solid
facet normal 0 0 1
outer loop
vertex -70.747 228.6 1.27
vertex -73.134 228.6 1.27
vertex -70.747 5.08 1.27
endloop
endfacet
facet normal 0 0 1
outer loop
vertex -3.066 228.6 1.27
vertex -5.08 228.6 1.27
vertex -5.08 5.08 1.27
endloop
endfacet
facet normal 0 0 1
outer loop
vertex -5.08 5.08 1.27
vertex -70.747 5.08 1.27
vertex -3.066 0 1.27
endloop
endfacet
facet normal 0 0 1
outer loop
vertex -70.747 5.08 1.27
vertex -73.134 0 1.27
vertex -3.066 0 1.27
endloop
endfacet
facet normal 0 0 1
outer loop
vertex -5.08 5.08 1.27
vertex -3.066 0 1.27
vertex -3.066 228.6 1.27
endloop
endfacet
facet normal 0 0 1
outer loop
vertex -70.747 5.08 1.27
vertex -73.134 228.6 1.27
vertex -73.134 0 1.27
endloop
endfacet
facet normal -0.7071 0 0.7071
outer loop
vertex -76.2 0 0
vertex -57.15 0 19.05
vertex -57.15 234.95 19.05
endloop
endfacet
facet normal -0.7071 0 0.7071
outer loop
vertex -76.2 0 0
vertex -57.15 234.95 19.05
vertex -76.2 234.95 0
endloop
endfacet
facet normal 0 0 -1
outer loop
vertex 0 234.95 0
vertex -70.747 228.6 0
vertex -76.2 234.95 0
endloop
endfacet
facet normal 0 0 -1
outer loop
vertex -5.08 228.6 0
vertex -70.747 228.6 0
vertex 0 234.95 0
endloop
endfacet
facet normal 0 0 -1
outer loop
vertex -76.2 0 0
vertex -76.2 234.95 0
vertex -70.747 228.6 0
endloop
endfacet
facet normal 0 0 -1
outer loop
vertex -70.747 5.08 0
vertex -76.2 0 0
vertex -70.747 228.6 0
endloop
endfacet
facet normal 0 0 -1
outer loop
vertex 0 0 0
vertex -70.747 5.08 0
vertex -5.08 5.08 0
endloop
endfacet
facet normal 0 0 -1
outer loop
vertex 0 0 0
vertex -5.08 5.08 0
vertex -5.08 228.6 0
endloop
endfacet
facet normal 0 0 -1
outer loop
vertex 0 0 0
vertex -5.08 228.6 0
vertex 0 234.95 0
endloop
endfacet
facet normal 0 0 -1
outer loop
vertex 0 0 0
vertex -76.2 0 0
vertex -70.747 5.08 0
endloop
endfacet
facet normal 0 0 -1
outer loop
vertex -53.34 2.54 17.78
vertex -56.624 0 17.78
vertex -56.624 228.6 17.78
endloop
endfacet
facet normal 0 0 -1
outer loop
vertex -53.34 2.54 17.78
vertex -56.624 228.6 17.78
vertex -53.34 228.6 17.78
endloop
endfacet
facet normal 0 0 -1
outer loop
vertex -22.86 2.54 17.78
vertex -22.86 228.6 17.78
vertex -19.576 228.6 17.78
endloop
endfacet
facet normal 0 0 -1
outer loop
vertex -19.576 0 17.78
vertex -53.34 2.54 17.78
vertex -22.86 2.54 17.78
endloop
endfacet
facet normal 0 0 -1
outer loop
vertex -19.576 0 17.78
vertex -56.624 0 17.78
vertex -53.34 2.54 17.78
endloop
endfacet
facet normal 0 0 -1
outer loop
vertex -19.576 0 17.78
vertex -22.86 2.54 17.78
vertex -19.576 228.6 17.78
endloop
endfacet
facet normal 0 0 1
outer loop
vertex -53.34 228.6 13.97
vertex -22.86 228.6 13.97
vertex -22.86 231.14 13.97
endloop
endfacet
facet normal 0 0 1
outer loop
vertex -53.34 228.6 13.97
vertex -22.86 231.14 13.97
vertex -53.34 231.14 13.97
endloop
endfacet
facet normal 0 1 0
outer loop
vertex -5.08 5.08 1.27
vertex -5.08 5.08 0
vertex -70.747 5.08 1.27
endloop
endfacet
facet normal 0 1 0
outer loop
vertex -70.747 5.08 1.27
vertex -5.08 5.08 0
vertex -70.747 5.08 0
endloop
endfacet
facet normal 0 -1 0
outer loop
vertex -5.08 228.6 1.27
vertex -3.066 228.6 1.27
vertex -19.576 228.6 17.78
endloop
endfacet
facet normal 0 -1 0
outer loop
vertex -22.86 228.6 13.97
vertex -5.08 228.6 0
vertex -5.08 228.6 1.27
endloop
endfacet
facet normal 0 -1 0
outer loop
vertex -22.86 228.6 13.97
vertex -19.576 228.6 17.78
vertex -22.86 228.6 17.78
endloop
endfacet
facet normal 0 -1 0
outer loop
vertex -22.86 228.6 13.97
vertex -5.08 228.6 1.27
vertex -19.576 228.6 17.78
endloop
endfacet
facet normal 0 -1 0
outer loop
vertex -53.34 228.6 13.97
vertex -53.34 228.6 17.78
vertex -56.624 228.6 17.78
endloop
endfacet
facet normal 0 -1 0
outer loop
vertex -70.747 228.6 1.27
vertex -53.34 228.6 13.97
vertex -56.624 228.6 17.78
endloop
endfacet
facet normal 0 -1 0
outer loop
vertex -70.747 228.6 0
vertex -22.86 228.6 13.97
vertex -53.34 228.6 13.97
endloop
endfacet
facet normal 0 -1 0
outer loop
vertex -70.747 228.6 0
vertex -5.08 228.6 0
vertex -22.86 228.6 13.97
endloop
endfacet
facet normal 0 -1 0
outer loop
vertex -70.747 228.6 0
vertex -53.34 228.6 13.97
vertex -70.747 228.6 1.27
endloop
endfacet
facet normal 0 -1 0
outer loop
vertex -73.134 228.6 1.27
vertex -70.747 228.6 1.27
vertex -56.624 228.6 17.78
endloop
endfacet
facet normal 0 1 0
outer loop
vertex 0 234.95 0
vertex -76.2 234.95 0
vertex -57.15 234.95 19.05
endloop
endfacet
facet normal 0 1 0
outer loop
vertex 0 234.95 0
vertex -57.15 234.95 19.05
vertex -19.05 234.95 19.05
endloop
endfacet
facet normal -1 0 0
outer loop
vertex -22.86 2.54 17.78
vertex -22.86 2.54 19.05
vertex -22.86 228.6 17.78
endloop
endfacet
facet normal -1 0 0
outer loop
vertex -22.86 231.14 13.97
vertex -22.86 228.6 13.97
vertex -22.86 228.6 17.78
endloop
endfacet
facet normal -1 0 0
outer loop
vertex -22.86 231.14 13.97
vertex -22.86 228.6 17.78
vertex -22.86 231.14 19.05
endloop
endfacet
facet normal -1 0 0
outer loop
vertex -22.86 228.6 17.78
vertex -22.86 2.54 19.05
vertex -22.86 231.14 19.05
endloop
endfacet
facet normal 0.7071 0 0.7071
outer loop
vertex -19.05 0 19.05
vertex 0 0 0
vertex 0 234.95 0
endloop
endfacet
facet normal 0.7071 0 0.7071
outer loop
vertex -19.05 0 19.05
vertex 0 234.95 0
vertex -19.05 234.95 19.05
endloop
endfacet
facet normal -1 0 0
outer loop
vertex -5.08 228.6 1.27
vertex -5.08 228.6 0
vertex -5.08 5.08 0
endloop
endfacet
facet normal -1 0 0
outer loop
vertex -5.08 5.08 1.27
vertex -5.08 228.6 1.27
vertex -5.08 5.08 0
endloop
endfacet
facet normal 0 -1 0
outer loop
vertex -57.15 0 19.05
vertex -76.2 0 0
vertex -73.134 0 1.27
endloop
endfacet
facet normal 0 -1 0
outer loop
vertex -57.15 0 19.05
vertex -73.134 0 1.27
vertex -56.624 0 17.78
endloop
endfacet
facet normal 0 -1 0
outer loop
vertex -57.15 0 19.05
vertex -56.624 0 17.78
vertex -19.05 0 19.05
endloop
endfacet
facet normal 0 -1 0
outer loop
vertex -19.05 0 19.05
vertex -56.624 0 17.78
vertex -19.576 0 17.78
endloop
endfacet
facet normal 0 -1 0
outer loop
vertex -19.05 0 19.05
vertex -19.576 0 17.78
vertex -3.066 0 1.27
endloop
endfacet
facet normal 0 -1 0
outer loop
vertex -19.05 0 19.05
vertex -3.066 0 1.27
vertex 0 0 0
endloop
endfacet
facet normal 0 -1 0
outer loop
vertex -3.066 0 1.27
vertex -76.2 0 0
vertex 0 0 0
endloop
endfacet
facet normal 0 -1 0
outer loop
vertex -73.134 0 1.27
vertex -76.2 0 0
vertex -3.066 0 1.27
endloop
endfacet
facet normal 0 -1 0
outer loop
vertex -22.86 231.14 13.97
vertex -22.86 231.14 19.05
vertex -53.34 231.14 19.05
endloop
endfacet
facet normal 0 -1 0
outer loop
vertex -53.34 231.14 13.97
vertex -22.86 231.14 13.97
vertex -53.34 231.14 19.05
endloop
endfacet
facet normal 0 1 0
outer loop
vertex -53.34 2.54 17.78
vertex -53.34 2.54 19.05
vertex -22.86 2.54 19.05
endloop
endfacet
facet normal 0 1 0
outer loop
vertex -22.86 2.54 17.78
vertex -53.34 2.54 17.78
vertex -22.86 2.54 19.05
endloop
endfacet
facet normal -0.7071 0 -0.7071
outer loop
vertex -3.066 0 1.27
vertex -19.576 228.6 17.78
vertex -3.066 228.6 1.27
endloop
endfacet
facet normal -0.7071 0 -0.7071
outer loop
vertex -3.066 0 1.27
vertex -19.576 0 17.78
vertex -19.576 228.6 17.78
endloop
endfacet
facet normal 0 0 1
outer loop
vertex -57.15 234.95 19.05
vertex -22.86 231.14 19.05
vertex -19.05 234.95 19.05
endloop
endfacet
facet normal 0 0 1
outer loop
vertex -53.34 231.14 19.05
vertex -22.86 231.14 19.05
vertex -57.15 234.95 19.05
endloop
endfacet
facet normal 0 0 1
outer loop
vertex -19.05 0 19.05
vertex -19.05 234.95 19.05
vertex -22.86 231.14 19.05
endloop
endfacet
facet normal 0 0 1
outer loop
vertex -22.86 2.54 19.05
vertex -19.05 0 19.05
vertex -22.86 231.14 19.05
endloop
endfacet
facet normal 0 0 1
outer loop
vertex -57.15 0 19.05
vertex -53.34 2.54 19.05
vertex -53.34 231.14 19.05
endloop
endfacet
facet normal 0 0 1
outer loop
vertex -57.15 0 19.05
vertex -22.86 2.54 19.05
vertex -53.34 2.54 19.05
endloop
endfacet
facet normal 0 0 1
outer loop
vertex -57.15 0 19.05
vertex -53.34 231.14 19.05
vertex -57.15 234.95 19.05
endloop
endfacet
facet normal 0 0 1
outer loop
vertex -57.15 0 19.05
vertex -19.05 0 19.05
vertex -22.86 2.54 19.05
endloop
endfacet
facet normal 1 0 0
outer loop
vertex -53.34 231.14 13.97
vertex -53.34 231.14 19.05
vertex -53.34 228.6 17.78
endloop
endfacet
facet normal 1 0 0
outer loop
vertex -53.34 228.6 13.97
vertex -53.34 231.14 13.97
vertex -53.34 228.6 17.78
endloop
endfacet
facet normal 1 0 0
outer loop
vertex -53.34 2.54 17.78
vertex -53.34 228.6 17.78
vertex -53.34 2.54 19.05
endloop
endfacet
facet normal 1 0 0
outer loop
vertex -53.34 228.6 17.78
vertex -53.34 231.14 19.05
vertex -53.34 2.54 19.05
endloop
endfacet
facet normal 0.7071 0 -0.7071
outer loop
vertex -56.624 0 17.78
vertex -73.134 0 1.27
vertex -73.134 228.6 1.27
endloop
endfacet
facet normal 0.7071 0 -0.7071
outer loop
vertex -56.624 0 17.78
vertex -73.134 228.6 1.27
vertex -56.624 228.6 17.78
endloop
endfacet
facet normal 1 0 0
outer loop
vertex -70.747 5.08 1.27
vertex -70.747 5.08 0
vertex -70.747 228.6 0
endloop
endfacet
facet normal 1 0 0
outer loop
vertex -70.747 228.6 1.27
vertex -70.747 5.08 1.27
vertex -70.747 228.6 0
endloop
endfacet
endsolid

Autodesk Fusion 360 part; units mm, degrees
sketch "top hopper side" plane through (0, 0, 0) normal (0, 1, 0) x (1, 0, 0)
  line L0 (-76.2, 0) -> (0, 0)
  line L1 (0, 0) -> (-19.05, -19.05)
  line L2 (-19.05, -19.05) -> (-57.15, -19.05)
  line L3 (-57.15, -19.05) -> (-76.2, 0)
  dimension "d12" = 76.2
  dimension "d13" = 38.1
  dimension "d14" = 45
extrude "Extrude3" add sketch "top hopper side" along normal blind 234.95
sketch "side cutout" plane through (0, 0, 0) normal (0, -1, 0) x (1, 0, 0)
  line L0 (-19.05, 19.05) -> (-57.15, 19.05)
  line L1 (-57.15, 19.05) -> (-76.2, 0)
  line L2 (-76.2, 0) -> (0, 0)
  line L3 (0, 0) -> (-19.05, 19.05)
  line L4 (-76.2, 0) -> (-57.15, 19.05)
  line L5 (-19.05, 19.05) -> (0, 0)
  line L6 (-76.2, 0) -> (0, 0)
  line L7 (-57.15, 19.05) -> (-19.05, 19.05)
  line L8 (-73.1339, 1.27) -> (-3.0661, 1.27)
  line L9 (-19.5761, 17.78) -> (-3.0661, 1.27)
  line L10 (-56.6239, 17.78) -> (-19.5761, 17.78)
  line L11 (-73.1339, 1.27) -> (-56.6239, 17.78)
  dimension "d17" = 1.27
extrude "Extrude4" cut sketch "side cutout" against normal blind 228.6 contours L8 L9 L10 L11
sketch "bottom cutout" plane through (0, 0, 0) normal (0, 0, -1) x (1, 0, 0)
  line L0 (0, 0) -> (-76.2, 0)
  line L1 (-76.2, 0) -> (-76.2, -234.95)
  line L2 (-76.2, -234.95) -> (0, -234.95)
  line L3 (0, -234.95) -> (0, 0)
  line L4 (-5.08, -5.08) -> (-70.7474, -5.08)
  line L5 (-70.7474, -5.08) -> (-70.7474, -228.6)
  line L6 (-5.08, -228.6) -> (-5.08, -5.08)
  line L7 (-5.08, -228.6) -> (-70.7474, -228.6)
  dimension "d20" = 223.52
  dimension "d21" = 65.6674
  dimension "d22" = 5.08
  dimension "d23" = 5.08
extrude "Extrude5" cut sketch "bottom cutout" against normal blind 2.54 contours L4 L5 L6 L7
sketch "top cutout" plane through (0, 0, 19.05) normal (0, 0, 1) x (-1, 0, 0)
  line L0 (57.15, 0) -> (19.05, 0)
  line L1 (19.05, 0) -> (19.05, -234.95)
  line L2 (19.05, -234.95) -> (57.15, -234.95)
  line L3 (57.15, -234.95) -> (57.15, 0)
  line L4 (53.34, -2.54) -> (22.86, -2.54)
  line L5 (22.86, -2.54) -> (22.86, -231.14)
  line L6 (22.86, -231.14) -> (53.34, -231.14)
  line L7 (53.34, -231.14) -> (53.34, -2.54)
  dimension "d26" = 228.6
  dimension "d27" = 30.48
  dimension "d28" = 3.81
  dimension "d29" = 2.54
extrude "Extrude6" cut sketch "top cutout" against normal blind 5.08 contours L4 L5 L6 L7
